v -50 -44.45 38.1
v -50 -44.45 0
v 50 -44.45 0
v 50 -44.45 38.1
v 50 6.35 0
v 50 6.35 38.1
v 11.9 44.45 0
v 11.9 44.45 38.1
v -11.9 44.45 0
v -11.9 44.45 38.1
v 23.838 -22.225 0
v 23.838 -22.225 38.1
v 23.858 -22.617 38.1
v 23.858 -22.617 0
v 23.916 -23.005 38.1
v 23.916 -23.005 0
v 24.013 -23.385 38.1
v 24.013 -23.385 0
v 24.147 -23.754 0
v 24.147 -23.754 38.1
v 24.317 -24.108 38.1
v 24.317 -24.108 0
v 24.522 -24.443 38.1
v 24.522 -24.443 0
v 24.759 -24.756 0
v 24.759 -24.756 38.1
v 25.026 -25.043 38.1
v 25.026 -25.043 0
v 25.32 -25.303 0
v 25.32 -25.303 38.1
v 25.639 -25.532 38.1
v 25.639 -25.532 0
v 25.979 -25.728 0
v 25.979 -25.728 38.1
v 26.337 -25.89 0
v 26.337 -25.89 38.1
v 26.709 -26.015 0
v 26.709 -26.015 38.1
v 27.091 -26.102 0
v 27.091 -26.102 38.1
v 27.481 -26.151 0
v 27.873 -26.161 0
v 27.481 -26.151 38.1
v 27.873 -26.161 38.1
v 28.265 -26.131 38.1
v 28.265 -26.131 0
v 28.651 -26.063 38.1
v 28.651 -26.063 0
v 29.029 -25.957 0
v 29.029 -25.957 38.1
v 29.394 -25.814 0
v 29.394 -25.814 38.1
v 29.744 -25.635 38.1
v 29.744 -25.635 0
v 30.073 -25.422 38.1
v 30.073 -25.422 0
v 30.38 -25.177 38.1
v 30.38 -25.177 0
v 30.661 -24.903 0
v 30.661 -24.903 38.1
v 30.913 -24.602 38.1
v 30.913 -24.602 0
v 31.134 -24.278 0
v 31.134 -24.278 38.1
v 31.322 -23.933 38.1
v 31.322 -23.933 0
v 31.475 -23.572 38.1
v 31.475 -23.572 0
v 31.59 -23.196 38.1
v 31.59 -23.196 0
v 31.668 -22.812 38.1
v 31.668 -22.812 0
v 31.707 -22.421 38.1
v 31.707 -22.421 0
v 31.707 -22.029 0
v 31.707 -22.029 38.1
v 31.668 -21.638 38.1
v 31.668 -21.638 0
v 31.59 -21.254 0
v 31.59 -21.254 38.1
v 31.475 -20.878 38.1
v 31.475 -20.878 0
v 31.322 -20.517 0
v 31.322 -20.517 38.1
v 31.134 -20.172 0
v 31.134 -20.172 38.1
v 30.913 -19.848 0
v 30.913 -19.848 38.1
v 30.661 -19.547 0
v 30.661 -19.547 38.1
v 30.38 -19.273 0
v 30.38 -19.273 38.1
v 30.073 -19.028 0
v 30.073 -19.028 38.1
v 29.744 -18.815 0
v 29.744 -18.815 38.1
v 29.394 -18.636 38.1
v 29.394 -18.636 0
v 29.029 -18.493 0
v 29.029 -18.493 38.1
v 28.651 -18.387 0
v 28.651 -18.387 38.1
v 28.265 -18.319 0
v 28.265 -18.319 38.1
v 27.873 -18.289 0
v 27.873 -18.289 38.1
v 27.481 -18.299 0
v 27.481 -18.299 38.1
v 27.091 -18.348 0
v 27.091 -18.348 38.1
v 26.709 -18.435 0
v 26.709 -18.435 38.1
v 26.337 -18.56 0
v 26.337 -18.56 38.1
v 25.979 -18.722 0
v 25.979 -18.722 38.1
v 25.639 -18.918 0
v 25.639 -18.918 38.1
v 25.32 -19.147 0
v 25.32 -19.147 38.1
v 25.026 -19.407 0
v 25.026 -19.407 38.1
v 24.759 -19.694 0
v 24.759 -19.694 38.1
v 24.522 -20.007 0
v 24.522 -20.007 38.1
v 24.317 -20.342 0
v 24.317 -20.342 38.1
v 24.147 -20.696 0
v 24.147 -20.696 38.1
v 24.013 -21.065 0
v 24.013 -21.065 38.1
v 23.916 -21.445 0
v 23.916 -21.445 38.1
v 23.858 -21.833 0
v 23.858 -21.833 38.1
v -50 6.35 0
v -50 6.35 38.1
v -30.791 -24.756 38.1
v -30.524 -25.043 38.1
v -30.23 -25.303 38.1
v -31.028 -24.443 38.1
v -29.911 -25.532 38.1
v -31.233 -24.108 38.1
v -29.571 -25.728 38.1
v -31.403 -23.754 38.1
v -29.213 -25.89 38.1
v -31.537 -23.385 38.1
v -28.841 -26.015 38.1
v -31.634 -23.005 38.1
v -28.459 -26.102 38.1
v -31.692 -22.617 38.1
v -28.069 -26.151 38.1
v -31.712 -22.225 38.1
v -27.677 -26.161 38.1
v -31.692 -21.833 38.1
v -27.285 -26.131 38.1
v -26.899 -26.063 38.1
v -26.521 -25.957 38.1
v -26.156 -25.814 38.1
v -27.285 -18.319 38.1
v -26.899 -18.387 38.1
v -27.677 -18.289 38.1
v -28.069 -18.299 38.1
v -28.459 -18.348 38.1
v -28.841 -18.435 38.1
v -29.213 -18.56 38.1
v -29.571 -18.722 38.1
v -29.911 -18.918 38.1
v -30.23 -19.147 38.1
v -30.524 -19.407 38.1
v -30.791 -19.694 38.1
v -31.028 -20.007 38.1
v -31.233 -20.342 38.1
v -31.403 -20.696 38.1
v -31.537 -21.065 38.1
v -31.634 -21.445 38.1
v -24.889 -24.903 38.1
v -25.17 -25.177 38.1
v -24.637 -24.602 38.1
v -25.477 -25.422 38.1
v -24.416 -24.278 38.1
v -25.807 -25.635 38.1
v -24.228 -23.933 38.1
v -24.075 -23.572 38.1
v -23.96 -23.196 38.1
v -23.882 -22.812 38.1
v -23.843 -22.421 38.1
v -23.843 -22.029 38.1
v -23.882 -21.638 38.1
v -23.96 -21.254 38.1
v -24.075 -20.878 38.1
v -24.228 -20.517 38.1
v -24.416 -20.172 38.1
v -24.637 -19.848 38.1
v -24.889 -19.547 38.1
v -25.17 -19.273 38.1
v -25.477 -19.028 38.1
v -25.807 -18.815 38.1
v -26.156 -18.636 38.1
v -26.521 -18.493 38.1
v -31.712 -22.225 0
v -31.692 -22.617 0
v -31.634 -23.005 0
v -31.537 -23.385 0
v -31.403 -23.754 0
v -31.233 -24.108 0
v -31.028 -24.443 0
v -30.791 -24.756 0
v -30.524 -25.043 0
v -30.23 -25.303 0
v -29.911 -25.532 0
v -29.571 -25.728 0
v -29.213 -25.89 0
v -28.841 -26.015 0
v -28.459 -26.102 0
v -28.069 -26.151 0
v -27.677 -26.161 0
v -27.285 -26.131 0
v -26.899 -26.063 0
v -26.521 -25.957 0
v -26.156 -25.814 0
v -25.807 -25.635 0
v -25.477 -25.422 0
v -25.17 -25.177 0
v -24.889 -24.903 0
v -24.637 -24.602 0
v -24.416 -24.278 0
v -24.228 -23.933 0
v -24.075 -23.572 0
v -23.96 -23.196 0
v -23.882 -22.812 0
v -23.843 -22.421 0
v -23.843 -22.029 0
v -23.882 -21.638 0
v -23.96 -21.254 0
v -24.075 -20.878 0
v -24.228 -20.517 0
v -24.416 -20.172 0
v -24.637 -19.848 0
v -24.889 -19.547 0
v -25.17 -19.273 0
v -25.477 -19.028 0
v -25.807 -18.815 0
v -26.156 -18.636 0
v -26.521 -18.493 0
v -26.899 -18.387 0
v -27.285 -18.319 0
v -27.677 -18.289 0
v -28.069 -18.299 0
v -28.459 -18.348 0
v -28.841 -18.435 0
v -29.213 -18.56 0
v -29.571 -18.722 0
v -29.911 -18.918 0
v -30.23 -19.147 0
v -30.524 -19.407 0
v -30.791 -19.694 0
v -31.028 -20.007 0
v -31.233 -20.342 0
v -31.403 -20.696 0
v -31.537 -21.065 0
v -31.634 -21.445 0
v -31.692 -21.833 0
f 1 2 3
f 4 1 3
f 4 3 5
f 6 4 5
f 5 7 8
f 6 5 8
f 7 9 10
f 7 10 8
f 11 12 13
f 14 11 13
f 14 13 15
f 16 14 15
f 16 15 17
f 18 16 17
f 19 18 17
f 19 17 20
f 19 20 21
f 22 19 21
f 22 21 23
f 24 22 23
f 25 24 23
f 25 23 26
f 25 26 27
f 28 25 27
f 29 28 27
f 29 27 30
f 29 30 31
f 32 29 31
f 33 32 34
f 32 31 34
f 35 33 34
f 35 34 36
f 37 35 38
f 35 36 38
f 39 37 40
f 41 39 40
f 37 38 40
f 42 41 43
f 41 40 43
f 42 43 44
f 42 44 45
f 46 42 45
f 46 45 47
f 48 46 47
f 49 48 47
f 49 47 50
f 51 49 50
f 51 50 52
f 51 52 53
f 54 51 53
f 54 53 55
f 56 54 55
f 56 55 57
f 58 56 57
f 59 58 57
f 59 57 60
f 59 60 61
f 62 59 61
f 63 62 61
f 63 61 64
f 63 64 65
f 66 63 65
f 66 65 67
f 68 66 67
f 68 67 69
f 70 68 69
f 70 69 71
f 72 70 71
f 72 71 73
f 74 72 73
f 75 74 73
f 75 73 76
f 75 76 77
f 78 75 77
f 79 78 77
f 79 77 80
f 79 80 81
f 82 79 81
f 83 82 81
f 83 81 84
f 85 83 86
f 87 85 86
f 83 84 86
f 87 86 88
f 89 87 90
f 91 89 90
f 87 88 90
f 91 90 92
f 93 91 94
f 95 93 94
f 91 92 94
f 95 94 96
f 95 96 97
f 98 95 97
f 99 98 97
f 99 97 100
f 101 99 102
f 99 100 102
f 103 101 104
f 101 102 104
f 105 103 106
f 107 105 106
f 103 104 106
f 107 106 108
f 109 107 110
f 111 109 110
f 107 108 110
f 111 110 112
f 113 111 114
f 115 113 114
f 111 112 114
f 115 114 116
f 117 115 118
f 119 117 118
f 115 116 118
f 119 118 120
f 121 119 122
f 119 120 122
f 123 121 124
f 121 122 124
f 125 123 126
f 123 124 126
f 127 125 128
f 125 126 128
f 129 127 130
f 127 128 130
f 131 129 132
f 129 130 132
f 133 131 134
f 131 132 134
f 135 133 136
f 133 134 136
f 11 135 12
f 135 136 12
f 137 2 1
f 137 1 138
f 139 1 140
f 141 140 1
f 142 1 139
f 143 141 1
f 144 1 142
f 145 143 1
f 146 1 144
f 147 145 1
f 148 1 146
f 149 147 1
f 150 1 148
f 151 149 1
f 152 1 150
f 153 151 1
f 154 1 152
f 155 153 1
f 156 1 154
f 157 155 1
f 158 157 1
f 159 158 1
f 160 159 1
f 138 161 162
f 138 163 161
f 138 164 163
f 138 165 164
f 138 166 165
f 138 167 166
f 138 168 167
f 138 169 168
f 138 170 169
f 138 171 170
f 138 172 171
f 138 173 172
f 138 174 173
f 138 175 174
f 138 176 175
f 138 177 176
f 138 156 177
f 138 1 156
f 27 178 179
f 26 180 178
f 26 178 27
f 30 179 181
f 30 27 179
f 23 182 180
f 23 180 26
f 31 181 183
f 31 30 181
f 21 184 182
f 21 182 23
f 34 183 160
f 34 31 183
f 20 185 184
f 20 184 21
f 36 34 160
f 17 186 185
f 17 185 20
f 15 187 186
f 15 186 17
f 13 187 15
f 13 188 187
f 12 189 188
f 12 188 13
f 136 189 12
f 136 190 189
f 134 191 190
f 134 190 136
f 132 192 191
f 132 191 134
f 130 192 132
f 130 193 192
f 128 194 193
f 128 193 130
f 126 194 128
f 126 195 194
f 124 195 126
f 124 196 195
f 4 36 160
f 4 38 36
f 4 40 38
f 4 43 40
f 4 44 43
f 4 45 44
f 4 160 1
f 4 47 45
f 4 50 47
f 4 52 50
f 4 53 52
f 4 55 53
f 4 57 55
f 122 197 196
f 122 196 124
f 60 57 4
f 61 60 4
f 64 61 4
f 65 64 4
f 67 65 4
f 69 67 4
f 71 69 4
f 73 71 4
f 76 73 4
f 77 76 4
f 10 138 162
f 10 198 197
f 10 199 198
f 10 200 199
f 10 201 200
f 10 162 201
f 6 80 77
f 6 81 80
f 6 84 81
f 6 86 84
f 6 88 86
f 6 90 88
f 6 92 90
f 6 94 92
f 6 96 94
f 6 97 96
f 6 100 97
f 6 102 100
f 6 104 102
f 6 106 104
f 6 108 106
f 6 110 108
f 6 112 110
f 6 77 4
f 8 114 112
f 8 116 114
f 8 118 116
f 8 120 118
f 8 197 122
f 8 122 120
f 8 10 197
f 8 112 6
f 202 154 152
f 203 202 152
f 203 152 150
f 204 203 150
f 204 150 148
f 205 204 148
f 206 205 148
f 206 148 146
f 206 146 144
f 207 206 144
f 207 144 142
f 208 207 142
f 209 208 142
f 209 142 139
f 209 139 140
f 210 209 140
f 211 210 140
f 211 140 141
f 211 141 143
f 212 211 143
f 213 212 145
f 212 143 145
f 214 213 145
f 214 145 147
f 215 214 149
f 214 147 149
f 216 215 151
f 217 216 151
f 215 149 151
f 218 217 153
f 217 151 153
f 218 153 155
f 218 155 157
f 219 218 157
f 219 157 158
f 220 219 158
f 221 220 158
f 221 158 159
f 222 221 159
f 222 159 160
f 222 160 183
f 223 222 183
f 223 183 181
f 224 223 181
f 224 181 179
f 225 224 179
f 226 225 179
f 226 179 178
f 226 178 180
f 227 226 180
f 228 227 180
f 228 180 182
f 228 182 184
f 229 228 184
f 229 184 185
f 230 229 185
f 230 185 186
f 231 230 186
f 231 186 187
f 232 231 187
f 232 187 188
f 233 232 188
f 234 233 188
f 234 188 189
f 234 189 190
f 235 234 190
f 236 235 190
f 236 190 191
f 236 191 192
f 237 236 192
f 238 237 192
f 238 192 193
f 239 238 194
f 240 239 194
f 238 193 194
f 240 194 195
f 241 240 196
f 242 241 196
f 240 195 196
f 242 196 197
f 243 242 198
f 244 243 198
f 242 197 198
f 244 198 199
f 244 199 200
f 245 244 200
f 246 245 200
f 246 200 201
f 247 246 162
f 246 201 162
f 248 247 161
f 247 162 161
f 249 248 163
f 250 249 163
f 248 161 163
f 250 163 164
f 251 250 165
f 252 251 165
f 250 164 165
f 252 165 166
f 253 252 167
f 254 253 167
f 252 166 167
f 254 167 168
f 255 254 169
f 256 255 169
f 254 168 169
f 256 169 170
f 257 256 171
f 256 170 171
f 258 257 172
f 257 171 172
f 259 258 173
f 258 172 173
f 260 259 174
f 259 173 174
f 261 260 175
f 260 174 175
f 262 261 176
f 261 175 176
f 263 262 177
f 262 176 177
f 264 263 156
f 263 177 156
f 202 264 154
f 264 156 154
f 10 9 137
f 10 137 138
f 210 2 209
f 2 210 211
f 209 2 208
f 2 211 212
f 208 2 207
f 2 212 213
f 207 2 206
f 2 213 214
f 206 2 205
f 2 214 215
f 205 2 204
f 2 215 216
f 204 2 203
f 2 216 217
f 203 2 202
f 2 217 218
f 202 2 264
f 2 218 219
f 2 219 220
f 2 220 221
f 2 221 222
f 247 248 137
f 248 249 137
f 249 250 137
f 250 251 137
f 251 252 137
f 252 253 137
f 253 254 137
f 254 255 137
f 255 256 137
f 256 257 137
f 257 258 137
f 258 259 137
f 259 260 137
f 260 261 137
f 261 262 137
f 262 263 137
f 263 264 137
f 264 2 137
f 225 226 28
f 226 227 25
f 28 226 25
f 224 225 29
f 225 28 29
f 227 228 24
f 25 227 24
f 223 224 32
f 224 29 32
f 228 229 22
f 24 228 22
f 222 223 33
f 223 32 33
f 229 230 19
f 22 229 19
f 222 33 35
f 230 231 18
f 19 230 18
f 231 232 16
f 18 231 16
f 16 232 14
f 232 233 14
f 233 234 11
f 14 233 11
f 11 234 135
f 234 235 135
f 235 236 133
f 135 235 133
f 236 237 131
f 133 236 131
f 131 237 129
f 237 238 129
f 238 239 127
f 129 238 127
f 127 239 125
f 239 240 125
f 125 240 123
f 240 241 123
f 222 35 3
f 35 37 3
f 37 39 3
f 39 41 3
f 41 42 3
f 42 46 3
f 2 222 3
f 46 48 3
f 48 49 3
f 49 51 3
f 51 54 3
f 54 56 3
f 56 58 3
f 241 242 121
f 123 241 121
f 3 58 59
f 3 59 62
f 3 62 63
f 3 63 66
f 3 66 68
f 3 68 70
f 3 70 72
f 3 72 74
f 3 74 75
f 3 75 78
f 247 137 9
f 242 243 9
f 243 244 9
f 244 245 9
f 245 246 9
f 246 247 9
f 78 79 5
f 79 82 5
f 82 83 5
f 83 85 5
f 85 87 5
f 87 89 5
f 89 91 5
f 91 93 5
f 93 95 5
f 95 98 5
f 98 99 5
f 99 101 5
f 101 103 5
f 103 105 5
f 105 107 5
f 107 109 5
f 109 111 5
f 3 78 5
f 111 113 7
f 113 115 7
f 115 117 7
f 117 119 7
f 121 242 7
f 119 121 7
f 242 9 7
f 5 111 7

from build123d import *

# Parameters (mm, degrees)
F0_W     = 100.000004
F0_H     = 88.9
F1_DEPTH = 38.1
F2_SIZE  = 38.1
F4_D     = 7.874


with BuildPart() as f1:
    # F0 (on Top) → F1 (new body)
    with BuildSketch(Plane.XY):
        Rectangle(F0_W, F0_H)
    extrude(amount=F1_DEPTH)

    # F2
    f2_edges = [f1.edges().sort_by_distance(p)[0] for p in [
        (50.000002, 44.45, 19.05),
        (-50.000002, 44.45, 19.05),
    ]]
    chamfer(f2_edges, length=F2_SIZE)

    # F4 (through all)
    with Locations(Plane(origin=(0, 0, 0), x_dir=(1, 0, 0), z_dir=(0, 0, -1))):
        with Locations((-27.775002, 22.225), (27.775002, 22.225)):
            Hole(F4_D / 2)


solid = f1.part
